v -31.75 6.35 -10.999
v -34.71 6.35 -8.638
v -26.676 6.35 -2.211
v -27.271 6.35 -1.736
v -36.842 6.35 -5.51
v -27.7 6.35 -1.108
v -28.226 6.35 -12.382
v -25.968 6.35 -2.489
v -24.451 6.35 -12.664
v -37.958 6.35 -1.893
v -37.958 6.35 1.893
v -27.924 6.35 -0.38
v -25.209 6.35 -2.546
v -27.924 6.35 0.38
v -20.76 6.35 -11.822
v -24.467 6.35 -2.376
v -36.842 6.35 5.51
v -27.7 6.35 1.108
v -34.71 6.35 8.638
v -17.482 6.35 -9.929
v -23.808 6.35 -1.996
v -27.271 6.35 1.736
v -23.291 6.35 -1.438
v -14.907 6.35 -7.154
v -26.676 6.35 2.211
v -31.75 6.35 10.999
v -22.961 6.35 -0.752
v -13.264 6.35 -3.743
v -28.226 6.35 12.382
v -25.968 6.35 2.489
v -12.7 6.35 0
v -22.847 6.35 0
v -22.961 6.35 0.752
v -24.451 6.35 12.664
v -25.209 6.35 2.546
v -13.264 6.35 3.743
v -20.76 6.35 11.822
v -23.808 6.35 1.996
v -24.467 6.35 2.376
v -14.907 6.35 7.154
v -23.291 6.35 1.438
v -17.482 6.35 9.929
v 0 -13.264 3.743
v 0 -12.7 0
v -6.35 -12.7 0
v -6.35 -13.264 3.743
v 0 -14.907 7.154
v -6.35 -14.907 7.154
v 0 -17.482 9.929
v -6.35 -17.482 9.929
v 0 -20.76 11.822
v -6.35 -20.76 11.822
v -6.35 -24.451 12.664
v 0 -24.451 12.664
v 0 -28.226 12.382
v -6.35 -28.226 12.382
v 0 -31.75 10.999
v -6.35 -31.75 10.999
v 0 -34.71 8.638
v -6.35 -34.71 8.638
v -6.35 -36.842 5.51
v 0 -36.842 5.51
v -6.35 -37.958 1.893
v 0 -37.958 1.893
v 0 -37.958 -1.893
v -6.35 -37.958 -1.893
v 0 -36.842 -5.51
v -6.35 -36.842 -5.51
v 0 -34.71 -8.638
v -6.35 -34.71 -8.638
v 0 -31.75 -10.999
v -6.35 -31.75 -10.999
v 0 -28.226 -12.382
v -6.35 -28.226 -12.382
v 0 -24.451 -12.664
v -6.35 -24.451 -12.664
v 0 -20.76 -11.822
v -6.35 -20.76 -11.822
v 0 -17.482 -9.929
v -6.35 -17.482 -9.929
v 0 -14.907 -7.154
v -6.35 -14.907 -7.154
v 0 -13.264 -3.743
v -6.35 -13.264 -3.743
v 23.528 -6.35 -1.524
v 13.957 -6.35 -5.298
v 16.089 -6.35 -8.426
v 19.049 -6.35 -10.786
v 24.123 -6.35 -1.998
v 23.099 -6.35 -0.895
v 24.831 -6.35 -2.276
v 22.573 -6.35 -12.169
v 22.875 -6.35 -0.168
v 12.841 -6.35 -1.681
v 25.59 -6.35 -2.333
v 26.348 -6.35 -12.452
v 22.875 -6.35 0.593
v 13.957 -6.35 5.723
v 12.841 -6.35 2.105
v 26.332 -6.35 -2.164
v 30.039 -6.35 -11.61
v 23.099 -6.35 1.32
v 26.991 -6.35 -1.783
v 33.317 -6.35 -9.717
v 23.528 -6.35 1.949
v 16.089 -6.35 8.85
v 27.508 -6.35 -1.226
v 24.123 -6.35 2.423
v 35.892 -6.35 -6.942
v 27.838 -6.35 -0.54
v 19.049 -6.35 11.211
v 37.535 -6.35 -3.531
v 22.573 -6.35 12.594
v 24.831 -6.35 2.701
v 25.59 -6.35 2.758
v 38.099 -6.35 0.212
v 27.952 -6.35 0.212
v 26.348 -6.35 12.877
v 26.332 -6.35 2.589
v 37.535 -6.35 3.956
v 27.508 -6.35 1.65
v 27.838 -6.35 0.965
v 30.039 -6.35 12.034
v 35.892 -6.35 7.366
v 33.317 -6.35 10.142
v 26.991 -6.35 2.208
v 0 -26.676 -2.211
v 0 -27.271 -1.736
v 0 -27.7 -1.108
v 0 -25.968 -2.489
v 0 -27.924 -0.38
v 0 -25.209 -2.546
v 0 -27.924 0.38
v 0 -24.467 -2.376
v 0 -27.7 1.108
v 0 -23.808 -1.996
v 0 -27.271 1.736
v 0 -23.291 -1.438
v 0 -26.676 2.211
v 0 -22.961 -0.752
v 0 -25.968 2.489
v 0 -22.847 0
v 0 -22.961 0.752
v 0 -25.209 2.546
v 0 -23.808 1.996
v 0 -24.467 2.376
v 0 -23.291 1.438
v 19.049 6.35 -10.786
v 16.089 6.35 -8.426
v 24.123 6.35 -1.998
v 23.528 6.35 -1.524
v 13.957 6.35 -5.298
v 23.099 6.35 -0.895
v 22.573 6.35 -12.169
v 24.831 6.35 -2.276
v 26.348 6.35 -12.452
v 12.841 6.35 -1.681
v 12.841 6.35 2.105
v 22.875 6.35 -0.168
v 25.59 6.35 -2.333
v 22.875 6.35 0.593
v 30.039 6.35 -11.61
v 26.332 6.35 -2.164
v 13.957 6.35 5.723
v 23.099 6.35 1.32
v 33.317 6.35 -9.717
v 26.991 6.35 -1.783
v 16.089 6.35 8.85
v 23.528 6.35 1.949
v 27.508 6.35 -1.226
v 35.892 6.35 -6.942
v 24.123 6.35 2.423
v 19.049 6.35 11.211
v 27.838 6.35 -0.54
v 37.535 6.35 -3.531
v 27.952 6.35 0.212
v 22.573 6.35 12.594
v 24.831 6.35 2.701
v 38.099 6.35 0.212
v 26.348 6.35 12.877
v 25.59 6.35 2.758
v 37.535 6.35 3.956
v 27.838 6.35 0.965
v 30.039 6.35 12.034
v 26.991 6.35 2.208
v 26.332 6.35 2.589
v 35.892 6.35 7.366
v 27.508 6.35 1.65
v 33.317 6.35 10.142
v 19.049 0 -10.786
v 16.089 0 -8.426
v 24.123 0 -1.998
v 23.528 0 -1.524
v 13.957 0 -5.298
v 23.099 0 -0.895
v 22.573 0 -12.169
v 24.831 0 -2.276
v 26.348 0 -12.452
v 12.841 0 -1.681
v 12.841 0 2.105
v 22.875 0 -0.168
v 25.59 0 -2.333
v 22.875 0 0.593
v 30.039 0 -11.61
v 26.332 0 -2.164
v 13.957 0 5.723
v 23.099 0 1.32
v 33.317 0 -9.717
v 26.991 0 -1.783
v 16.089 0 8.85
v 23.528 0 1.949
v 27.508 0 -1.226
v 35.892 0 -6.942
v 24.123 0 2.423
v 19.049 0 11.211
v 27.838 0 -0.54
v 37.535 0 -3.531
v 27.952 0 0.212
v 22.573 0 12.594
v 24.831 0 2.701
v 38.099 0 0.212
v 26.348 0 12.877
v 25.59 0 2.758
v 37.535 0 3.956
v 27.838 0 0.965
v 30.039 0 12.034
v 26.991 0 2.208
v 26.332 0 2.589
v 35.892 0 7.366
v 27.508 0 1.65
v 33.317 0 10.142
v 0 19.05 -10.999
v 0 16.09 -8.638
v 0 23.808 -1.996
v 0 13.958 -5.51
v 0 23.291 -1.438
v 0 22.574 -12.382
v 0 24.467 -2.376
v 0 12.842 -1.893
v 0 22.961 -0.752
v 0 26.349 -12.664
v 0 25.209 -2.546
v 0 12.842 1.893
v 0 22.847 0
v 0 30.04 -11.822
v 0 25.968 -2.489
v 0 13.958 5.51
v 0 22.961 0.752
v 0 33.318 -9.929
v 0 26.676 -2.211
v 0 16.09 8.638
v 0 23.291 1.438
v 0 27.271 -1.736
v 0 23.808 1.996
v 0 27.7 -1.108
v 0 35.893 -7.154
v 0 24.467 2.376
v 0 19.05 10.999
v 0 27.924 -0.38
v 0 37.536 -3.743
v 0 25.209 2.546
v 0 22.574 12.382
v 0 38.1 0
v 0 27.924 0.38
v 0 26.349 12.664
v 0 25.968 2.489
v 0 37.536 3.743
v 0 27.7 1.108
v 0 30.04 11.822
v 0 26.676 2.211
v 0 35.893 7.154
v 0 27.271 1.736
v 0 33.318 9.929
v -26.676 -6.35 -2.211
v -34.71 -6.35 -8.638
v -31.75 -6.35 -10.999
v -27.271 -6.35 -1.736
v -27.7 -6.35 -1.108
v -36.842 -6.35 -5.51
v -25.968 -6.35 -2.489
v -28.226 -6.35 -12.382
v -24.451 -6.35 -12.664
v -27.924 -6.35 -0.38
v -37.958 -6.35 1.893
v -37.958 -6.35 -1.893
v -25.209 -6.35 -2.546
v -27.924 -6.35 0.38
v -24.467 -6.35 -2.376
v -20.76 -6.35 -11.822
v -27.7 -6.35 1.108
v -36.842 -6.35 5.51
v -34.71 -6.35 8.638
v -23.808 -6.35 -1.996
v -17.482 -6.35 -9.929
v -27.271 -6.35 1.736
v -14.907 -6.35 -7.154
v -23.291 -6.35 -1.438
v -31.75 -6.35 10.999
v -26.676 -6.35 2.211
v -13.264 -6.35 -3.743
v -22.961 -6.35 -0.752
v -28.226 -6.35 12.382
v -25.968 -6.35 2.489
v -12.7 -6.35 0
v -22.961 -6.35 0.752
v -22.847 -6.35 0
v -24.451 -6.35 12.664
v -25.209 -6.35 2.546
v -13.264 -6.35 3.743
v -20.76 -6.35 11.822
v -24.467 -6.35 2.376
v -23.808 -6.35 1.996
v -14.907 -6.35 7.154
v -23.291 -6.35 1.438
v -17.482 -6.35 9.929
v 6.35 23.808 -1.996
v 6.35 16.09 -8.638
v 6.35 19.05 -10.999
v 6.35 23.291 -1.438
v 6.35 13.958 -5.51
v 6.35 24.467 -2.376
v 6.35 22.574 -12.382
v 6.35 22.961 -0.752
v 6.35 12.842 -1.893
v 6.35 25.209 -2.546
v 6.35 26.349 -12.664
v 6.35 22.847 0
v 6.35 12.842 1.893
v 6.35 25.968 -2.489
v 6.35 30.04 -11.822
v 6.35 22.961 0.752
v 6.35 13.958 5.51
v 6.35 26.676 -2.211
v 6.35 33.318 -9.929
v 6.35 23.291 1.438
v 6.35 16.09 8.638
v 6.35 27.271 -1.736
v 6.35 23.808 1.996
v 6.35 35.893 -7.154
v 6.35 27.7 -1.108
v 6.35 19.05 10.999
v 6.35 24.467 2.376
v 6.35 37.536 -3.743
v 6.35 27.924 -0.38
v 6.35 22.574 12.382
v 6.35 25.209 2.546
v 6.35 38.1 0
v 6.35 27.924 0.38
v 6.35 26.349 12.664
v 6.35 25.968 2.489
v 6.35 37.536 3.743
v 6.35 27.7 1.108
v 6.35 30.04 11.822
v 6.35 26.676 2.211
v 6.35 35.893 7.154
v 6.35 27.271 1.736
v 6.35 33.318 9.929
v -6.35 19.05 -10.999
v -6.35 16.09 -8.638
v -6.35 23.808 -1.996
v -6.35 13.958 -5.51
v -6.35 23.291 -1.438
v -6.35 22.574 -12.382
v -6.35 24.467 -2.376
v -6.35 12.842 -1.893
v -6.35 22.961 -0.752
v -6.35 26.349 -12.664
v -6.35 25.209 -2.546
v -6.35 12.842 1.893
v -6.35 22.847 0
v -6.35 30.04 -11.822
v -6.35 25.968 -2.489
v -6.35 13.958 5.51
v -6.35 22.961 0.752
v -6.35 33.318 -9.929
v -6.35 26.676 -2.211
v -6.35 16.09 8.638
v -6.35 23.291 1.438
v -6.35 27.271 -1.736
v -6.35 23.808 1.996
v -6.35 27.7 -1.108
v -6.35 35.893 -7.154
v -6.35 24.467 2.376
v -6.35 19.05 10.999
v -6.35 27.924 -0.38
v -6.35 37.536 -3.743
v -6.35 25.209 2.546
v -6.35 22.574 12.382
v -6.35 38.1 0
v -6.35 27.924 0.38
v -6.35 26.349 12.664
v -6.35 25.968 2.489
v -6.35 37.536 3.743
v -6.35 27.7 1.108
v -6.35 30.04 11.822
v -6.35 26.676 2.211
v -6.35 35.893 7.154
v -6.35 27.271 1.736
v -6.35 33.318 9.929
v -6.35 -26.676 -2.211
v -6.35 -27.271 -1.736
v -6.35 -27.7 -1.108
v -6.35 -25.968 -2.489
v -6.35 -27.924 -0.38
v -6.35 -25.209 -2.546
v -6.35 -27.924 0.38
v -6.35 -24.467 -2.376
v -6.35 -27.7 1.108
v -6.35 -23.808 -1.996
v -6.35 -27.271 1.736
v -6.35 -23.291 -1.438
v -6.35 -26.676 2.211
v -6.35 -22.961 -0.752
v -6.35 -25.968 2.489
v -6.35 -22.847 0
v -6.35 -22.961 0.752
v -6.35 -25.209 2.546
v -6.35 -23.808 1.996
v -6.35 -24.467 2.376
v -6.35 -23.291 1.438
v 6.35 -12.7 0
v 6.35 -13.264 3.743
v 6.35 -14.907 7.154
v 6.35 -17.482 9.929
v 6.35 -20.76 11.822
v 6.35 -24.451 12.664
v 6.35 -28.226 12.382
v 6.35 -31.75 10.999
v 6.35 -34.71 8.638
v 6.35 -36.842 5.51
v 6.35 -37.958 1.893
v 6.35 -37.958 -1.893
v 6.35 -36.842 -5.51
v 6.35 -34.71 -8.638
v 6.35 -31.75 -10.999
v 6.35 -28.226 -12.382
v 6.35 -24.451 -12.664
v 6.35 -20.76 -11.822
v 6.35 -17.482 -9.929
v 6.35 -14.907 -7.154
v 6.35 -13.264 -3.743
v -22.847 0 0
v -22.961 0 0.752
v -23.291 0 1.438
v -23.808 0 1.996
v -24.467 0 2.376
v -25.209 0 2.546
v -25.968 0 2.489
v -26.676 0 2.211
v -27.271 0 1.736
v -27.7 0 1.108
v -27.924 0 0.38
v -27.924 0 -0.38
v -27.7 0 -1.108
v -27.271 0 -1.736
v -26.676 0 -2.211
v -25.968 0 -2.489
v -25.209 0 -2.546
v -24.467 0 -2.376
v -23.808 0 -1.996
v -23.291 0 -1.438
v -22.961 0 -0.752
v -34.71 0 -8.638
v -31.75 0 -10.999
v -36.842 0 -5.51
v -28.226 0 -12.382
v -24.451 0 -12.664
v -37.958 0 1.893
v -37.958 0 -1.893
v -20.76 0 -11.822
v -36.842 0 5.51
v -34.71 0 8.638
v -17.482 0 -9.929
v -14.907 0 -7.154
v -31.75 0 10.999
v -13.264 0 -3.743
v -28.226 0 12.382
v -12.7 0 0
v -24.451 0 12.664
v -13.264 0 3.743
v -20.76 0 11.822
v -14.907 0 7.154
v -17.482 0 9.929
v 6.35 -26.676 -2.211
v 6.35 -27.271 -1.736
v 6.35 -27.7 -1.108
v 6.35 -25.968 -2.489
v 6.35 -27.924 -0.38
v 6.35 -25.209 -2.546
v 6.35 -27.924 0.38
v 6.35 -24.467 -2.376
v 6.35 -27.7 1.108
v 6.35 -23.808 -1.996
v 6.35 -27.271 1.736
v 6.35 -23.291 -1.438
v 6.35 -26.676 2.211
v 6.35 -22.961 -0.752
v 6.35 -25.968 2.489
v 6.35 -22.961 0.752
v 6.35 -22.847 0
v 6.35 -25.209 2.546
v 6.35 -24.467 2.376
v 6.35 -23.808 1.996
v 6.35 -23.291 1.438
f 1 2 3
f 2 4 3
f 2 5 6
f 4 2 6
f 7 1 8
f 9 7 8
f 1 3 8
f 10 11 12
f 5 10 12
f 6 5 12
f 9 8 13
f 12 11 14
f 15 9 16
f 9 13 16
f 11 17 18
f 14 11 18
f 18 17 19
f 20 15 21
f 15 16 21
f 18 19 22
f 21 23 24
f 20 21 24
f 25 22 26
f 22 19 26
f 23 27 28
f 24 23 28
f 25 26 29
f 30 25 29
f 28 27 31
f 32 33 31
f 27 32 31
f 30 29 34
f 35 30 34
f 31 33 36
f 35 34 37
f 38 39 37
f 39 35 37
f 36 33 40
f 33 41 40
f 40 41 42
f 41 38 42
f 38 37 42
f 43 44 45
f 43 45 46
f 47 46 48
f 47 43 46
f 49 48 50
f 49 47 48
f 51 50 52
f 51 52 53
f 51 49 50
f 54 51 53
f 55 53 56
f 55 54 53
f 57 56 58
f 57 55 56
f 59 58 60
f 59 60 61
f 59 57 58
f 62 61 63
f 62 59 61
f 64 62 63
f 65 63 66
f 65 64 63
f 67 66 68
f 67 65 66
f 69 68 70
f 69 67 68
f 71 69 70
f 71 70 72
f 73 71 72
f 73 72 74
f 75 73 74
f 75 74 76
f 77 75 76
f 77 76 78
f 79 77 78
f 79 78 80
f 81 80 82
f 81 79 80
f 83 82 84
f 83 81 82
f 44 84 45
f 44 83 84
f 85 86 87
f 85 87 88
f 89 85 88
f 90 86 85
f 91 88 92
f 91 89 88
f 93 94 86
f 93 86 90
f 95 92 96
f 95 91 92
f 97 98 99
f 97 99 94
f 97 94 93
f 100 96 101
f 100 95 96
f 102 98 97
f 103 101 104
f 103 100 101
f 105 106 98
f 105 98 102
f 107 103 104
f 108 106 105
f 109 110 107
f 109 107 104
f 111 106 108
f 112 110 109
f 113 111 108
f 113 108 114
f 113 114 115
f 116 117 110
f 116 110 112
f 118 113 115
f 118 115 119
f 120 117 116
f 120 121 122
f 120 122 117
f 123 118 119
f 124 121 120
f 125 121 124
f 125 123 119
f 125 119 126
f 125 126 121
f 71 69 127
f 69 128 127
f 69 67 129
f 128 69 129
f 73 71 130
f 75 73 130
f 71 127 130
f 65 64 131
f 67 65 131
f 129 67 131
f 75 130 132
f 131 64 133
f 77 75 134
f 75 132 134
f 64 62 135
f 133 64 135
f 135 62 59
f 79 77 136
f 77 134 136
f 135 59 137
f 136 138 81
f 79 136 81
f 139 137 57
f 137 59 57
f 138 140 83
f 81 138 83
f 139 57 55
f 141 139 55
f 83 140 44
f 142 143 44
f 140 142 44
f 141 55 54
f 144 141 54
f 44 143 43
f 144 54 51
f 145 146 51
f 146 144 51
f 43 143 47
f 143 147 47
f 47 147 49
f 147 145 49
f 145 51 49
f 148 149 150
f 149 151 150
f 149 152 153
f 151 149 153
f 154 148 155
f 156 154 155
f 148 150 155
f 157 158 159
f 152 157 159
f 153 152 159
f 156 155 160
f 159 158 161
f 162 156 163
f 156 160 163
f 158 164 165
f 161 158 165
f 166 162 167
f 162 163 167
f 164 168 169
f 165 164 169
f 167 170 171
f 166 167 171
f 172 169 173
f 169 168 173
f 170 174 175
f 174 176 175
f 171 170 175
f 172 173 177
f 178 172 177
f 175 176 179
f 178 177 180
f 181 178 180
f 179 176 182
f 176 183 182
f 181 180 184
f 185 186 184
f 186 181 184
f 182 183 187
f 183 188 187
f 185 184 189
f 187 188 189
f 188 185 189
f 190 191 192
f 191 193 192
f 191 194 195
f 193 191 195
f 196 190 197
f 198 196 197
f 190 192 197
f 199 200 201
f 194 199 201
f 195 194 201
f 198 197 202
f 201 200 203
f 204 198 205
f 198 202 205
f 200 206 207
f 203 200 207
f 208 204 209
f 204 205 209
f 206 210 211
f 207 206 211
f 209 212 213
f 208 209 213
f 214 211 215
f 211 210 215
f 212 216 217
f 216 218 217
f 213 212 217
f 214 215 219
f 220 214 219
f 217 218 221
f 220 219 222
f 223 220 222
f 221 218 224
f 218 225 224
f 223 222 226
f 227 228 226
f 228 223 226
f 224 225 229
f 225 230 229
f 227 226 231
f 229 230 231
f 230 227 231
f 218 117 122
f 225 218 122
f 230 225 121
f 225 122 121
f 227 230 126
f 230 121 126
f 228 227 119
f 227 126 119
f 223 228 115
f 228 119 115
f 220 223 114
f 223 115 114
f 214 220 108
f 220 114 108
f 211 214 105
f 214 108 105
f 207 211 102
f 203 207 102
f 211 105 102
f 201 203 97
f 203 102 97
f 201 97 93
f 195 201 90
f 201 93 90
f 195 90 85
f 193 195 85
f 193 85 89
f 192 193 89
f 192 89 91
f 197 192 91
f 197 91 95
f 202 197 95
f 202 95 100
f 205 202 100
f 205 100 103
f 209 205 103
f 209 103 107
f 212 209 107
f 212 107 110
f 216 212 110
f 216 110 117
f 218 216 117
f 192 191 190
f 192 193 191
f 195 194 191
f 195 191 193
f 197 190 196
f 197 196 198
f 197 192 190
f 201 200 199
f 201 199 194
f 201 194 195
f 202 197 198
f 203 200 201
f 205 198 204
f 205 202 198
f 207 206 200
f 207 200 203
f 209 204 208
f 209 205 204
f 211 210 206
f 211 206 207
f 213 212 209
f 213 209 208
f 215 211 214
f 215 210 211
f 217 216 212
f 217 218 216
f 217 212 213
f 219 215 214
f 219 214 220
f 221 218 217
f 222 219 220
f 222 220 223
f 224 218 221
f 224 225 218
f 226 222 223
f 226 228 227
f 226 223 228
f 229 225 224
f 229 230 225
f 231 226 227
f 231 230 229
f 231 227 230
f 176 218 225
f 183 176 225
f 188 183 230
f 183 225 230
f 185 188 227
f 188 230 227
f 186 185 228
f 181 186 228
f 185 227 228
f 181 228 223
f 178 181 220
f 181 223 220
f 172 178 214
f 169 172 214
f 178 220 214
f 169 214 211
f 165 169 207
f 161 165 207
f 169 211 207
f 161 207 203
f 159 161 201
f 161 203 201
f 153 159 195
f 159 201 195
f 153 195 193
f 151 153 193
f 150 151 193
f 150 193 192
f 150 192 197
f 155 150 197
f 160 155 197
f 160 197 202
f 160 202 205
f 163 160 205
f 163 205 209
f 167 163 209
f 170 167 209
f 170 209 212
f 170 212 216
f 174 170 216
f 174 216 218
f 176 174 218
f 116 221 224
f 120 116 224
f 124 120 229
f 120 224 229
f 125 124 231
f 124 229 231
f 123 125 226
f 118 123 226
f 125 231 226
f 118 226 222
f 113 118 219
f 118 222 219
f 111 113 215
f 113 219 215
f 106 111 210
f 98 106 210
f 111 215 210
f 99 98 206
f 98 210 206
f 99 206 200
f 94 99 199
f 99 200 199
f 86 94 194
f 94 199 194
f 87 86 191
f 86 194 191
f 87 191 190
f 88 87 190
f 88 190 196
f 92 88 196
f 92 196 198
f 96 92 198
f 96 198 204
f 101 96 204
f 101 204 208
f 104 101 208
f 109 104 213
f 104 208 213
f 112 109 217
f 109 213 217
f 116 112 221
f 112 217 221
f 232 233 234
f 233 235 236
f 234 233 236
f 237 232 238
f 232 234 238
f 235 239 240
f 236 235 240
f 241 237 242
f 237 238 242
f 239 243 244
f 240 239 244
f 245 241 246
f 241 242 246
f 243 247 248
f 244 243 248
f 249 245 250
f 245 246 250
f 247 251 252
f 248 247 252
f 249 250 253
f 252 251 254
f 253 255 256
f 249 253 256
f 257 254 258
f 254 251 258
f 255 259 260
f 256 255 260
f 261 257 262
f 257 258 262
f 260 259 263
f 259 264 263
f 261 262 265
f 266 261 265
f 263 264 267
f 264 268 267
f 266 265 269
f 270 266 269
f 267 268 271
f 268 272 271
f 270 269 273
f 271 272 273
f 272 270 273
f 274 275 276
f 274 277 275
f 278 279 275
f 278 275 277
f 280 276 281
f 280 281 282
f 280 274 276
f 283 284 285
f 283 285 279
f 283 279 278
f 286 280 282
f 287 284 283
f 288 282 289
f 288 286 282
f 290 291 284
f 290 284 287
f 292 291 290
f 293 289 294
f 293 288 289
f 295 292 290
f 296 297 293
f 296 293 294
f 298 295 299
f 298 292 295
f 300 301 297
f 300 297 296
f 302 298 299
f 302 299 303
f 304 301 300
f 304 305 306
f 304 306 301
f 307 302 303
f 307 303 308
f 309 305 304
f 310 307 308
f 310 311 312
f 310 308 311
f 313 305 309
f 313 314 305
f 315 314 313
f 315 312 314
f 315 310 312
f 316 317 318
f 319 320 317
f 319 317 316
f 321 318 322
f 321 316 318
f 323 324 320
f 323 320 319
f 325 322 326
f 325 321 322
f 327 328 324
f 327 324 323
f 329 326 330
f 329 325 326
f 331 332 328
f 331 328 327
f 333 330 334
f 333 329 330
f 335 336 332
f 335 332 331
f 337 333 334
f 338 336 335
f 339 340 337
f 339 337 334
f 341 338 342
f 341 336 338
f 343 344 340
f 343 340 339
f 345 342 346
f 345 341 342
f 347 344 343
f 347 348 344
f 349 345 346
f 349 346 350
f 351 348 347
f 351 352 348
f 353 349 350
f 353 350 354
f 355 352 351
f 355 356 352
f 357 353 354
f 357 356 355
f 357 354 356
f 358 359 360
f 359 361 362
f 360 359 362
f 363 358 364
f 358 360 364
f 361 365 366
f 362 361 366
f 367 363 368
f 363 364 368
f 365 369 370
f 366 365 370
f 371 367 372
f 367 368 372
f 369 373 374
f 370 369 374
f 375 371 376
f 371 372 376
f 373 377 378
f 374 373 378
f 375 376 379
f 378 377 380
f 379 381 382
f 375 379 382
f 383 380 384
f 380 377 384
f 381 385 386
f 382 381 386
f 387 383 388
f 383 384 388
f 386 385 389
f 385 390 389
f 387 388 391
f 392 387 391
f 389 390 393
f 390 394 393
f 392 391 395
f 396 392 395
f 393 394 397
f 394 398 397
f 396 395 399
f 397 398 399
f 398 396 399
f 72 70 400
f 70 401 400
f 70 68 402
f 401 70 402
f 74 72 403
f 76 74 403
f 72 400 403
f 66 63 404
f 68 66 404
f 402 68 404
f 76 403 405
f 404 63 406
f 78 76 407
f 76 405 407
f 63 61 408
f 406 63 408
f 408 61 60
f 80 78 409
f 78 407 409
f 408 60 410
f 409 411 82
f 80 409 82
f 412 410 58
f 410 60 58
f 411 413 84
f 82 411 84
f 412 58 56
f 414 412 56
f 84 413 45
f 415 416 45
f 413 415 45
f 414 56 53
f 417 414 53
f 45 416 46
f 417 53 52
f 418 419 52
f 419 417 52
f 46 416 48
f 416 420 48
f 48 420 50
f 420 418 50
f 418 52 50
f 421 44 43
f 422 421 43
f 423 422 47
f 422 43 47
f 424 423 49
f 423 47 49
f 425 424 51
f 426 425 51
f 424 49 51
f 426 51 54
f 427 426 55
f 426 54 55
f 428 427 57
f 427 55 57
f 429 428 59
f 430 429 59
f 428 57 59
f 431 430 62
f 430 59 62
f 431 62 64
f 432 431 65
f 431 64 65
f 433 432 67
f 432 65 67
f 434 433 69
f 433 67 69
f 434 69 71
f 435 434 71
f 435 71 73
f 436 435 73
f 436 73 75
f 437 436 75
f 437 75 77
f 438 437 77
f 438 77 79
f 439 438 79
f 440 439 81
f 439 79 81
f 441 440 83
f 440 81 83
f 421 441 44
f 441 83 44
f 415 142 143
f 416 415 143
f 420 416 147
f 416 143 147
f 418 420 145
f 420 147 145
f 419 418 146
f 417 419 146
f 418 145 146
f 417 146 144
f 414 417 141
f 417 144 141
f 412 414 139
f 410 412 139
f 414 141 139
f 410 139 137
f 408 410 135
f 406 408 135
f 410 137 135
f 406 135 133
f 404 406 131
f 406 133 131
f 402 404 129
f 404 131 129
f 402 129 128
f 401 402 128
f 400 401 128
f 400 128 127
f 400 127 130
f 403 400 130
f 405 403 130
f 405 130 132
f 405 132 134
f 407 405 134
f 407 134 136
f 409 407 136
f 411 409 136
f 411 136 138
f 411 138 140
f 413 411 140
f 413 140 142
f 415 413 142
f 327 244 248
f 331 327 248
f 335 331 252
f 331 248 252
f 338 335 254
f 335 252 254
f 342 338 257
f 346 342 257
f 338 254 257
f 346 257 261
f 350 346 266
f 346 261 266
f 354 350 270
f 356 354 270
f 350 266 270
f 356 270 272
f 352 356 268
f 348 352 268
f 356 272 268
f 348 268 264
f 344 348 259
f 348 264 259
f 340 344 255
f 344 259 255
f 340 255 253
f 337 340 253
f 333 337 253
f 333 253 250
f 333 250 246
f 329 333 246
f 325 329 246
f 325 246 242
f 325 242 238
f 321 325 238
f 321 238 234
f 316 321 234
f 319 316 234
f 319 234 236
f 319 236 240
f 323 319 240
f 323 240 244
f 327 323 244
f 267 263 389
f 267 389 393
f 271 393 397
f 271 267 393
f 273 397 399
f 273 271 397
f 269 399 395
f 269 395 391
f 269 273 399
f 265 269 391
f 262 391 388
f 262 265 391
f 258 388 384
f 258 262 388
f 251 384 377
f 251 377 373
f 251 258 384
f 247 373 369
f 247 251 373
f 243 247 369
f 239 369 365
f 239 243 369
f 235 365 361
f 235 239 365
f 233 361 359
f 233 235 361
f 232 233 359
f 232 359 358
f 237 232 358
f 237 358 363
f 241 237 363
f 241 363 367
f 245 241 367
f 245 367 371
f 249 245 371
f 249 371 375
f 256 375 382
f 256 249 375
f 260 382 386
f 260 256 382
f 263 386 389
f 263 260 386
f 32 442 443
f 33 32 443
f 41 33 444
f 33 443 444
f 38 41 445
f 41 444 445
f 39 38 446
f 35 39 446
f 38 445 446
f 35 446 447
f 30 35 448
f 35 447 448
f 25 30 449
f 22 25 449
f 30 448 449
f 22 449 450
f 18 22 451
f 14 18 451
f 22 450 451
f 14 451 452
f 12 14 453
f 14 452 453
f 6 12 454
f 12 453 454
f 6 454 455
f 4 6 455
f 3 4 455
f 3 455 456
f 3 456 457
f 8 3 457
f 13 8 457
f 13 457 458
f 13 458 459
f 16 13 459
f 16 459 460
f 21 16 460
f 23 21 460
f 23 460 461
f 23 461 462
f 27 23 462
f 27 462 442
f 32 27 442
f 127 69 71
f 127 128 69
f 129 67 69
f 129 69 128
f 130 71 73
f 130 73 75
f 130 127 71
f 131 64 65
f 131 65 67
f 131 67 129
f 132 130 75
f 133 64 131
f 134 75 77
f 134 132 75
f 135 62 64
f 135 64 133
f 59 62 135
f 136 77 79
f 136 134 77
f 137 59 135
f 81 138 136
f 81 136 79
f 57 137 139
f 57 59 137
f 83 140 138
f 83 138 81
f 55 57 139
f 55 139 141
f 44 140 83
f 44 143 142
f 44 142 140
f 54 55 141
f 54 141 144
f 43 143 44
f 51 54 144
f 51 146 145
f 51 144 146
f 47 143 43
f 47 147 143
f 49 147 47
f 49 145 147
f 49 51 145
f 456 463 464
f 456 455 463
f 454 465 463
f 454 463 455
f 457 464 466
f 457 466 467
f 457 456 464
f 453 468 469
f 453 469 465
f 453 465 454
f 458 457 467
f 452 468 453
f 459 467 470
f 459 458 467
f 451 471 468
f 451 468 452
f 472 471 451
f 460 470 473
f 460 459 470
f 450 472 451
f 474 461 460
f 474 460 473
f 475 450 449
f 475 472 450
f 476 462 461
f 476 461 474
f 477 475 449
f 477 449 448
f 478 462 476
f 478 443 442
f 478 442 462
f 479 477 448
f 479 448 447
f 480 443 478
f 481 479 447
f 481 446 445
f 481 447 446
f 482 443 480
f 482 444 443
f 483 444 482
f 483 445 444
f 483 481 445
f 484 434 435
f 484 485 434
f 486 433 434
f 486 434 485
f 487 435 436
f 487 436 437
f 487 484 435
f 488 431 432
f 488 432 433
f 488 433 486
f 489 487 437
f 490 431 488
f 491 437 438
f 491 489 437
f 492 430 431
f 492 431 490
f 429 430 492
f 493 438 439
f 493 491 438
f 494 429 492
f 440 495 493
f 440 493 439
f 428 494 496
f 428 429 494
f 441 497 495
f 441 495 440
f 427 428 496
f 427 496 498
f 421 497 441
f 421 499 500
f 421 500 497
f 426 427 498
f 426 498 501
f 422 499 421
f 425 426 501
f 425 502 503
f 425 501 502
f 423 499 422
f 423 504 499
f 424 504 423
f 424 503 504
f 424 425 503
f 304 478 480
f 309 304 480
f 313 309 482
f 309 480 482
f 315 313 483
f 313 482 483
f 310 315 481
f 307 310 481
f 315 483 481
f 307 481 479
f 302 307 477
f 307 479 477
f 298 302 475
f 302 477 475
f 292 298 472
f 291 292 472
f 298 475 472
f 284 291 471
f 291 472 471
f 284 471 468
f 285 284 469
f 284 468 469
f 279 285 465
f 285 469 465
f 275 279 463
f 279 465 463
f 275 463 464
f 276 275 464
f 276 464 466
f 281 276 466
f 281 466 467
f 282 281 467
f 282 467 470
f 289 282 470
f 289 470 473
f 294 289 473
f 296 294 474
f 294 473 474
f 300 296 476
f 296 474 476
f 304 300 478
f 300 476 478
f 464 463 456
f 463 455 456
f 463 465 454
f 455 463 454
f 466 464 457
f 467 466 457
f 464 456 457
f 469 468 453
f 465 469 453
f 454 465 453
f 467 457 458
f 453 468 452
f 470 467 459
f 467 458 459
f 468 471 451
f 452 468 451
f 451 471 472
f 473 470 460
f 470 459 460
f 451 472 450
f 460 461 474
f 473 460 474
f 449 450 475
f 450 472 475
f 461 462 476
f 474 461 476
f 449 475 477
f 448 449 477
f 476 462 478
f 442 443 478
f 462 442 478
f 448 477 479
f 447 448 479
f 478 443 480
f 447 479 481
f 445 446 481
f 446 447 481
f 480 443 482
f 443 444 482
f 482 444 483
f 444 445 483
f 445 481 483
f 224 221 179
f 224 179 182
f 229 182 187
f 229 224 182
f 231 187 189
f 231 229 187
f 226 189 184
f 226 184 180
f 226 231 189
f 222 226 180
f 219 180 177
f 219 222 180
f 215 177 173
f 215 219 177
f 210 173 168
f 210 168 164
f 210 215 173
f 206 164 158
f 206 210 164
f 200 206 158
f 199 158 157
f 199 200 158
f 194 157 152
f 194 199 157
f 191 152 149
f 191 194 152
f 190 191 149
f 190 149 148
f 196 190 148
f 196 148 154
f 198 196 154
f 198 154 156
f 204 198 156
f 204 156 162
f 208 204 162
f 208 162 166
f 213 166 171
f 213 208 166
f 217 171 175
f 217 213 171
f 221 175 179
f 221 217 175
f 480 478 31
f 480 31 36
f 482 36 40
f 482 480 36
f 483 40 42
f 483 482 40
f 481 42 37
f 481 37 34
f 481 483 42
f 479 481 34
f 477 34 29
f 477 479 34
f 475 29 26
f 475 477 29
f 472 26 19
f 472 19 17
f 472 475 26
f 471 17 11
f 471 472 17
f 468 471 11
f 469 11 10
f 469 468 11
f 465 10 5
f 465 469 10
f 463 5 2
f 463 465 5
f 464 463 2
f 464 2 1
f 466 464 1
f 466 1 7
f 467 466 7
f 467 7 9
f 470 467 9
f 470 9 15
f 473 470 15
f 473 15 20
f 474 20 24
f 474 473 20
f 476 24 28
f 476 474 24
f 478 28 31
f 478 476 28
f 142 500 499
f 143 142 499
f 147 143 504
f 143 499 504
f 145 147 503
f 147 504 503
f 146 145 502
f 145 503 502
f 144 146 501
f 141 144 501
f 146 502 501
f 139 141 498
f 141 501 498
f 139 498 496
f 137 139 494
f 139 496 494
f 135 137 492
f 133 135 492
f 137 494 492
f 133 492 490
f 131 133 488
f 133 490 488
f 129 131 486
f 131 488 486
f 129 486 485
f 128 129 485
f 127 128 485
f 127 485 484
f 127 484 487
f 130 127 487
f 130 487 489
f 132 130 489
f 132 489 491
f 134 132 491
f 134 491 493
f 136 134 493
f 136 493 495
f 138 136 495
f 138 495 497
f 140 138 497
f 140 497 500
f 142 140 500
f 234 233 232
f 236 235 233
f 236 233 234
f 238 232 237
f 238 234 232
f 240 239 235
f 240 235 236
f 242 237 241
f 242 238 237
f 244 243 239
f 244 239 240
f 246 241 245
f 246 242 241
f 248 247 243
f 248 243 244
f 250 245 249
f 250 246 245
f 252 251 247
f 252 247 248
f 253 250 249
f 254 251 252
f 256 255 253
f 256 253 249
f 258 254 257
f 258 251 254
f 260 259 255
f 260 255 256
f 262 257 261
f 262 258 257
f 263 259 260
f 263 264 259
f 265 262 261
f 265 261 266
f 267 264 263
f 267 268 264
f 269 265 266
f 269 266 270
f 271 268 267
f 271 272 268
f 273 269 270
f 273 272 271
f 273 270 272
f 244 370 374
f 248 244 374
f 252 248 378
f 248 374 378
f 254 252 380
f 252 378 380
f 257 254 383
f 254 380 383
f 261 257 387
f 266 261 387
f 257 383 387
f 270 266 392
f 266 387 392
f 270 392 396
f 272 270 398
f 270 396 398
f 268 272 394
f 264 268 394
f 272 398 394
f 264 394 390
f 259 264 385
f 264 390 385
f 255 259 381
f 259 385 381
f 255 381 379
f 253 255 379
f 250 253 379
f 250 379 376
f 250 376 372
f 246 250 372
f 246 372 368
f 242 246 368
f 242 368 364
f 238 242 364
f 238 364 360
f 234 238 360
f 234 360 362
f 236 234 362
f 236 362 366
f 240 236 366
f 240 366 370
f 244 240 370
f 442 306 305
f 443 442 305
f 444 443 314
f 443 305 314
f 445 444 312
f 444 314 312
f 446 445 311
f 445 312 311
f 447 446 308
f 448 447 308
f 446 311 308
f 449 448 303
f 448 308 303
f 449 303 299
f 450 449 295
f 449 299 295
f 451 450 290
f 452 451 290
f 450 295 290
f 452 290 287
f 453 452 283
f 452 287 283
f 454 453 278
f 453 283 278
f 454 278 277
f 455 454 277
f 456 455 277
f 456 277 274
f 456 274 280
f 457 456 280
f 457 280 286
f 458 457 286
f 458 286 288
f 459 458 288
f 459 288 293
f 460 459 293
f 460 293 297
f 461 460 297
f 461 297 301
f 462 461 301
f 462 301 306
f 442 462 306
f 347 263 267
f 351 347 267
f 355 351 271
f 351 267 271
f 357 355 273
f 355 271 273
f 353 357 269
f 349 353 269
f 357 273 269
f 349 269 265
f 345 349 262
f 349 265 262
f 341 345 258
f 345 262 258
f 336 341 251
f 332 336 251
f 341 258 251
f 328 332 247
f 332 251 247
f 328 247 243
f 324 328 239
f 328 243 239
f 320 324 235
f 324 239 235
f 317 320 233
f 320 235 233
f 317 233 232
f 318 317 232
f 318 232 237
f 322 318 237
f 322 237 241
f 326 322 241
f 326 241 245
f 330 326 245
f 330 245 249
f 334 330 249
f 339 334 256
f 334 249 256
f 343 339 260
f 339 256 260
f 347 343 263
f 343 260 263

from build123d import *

# Parameters (mm, degrees)
F0_R      = 12.7
F1_DEPTH  = 6.35
F2_DEPTH  = 6.35
F3_R      = 2.5527
F4_DEPTH  = 50.8
F5_R      = 2.5527
F6_DEPTH  = 25.4
F7_R      = 2.5527
F8_DEPTH  = 25.4
F9_R      = 2.5527
F10_DEPTH = 25.4
F11_R     = 12.7
F12_DEPTH = 6.35
F13_DEPTH = 6.35
F14_R     = 2.5527
F15_DEPTH = 25.4
F16_R     = 2.5527
F17_DEPTH = 25.4
F18_R     = 2.5527
F19_DEPTH = 25.4
F20_R     = 2.5527
F21_DEPTH = 25.4


with BuildPart() as f1:
    # F0 (on Front) → F1 (new body)
    with BuildSketch(Plane.XZ):
        with Locations((25.3991128396, 0.2122898001)):
            Circle(F0_R)
    extrude(amount=F1_DEPTH)


with BuildPart() as f1b:
    # F0 (on Front) → F1, piece 2 (new body)
    with BuildSketch(Plane.XZ):
        with Locations((-25.4, 0)):
            Circle(F0_R)
    extrude(amount=F1_DEPTH)


with BuildPart() as f2:
    # F2 (new): a face of the model
    f2_faces = [f1b.part.faces().sort_by_distance(p)[0] for p in [
        (-25.4, 0, 0),
    ]]
    extrude(f2_faces, amount=F2_DEPTH)


with BuildPart() as f2b:
    # F2#2 (new): a face of the model
    f2_2_faces = [f1.part.faces().sort_by_distance(p)[0] for p in [
        (25.3991128396, 0, 0.2122898001),
    ]]
    extrude(f2_2_faces, amount=F2_DEPTH)


with BuildPart() as f4_tool:
    # F3 (on face) → F4 (new body)
    with BuildSketch(Plane.XZ.offset(6.35)):
        with Locations((-25.4, 0)):
            Circle(F3_R)
    extrude(amount=-F4_DEPTH)


with BuildPart() as f1b_1:
    add(f1b.part)

    # F4: cut by f4_tool
    add(f4_tool.part, mode=Mode.SUBTRACT)


with BuildPart() as f2_1:
    add(f2.part)

    # F4: cut by f4_tool
    add(f4_tool.part, mode=Mode.SUBTRACT)


with BuildPart() as f1_1:
    add(f1.part)

    # F5 (on face) → F6 (cut)
    with BuildSketch(Plane(origin=(0, 6.35, 0), x_dir=(-1, 0, 0), z_dir=(0, 1, 0))):
        with Locations((25.4, 0)):
            Circle(F5_R)
    extrude(amount=-F6_DEPTH, mode=Mode.SUBTRACT)


with BuildPart() as f8_tool:
    # F7 (on face) → F8 (new body)
    with BuildSketch(Plane.XZ.offset(6.35)):
        with Locations((25.3991128396, 0.2122898001)):
            Circle(F7_R)
    extrude(amount=-F8_DEPTH)


with BuildPart() as f1_2:
    add(f1_1.part)

    # F8: cut by f8_tool
    add(f8_tool.part, mode=Mode.SUBTRACT)

    # F9 (on face) → F10 (cut)
    with BuildSketch(Plane(origin=(0, 6.35, 0), x_dir=(-1, 0, 0), z_dir=(0, 1, 0))):
        with Locations((-25.3991128396, 0.2122898001)):
            Circle(F9_R)
    extrude(amount=-F10_DEPTH, mode=Mode.SUBTRACT)

    # F16 (on face) → F17 (cut)
    with BuildSketch(Plane.YZ.offset(6.35)):
        with Locations((25.4, 0)):
            Circle(F16_R)
    extrude(amount=-F17_DEPTH, mode=Mode.SUBTRACT)

    # F20 (on face) → F21 (cut)
    with BuildSketch(Plane(origin=(-6.35, 0, 0), x_dir=(0, -1, 0), z_dir=(-1, 0, 0))):
        with Locations((25.4, 0)):
            Circle(F20_R)
    extrude(amount=-F21_DEPTH, mode=Mode.SUBTRACT)


with BuildPart() as f2b_1:
    add(f2b.part)

    # F8: cut by f8_tool
    add(f8_tool.part, mode=Mode.SUBTRACT)


with BuildPart() as f12:
    # F11 (on Right) → F12 (new body)
    with BuildSketch(Plane.YZ):
        with Locations((-25.4, 0)):
            Circle(F11_R)
    extrude(amount=F12_DEPTH)


with BuildPart() as f12b:
    # F11 (on Right) → F12, piece 2 (new body)
    with BuildSketch(Plane.YZ):
        with Locations((25.4, 0)):
            Circle(F11_R)
    extrude(amount=F12_DEPTH)


with BuildPart() as f13:
    # F13 (new): a face of the model
    f13_faces = [f12b.part.faces().sort_by_distance(p)[0] for p in [
        (0, 25.4, 0),
    ]]
    extrude(f13_faces, amount=F13_DEPTH)


with BuildPart() as f13b:
    # F13#2 (new): a face of the model
    f13_2_faces = [f12.part.faces().sort_by_distance(p)[0] for p in [
        (0, -25.4, 0),
    ]]
    extrude(f13_2_faces, amount=F13_DEPTH)


with BuildPart() as f15_tool:
    # F14 (on face) → F15 (new body)
    with BuildSketch(Plane(origin=(-6.35, 0, 0), x_dir=(0, -1, 0), z_dir=(-1, 0, 0))):
        with Locations((-25.4, 0)):
            Circle(F14_R)
    extrude(amount=-F15_DEPTH)


with BuildPart() as f12b_1:
    add(f12b.part)

    # F15: cut by f15_tool
    add(f15_tool.part, mode=Mode.SUBTRACT)


with BuildPart() as f13_1:
    add(f13.part)

    # F15: cut by f15_tool
    add(f15_tool.part, mode=Mode.SUBTRACT)


with BuildPart() as f19_tool:
    # F18 (on face) → F19 (new body)
    with BuildSketch(Plane.YZ.offset(6.35)):
        with Locations((-25.4, 0)):
            Circle(F18_R)
    extrude(amount=-F19_DEPTH)


with BuildPart() as f12_1:
    add(f12.part)

    # F19: cut by f19_tool
    add(f19_tool.part, mode=Mode.SUBTRACT)


with BuildPart() as f13b_1:
    add(f13b.part)

    # F19: cut by f19_tool
    add(f19_tool.part, mode=Mode.SUBTRACT)


solid = Compound([f1b_1.part, f2_1.part, f1_2.part, f2b_1.part, f12b_1.part, f13_1.part, f12_1.part, f13b_1.part])
